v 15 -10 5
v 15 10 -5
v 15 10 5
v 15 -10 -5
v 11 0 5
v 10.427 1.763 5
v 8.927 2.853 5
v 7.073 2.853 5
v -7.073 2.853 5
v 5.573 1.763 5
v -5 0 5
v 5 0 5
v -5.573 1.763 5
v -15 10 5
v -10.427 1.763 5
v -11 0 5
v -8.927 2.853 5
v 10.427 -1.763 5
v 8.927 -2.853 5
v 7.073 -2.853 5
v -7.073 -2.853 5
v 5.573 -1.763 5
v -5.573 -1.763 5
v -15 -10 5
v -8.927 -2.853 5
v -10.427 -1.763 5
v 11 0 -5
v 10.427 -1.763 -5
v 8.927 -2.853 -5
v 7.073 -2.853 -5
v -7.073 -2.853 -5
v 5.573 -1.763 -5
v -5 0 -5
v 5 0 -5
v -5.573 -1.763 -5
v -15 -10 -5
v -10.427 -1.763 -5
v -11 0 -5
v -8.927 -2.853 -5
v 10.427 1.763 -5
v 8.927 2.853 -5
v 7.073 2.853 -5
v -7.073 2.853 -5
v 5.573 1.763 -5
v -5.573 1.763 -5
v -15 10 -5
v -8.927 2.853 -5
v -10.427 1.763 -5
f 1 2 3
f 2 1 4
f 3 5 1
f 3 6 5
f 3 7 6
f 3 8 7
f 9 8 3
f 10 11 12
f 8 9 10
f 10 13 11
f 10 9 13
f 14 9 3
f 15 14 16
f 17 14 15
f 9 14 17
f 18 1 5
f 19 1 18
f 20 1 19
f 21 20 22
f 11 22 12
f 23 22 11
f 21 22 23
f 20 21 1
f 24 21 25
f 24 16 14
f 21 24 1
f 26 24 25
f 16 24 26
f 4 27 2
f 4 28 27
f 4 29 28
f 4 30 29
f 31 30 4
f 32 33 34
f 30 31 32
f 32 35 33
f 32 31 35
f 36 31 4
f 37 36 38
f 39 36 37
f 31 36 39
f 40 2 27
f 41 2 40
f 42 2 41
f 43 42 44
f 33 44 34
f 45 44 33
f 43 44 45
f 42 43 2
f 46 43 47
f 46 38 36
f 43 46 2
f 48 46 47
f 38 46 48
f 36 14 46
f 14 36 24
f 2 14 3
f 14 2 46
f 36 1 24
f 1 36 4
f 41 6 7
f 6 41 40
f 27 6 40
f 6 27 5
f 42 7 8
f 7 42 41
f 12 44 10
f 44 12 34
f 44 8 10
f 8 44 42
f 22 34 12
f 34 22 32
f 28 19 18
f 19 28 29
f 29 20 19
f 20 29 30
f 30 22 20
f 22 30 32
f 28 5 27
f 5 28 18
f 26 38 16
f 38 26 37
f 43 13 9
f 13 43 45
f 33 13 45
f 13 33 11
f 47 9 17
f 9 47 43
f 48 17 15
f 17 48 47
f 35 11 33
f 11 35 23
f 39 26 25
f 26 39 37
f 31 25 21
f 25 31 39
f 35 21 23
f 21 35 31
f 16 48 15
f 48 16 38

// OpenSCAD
// Simple box with cylindrical holes
difference() {
    cube([30, 20, 10], center = true);
    translate([8, 0, 0]) cylinder(h = 20, r = 3, center = true);
    translate([-8, 0, 0]) cylinder(h = 20, r = 3, center = true);
}
